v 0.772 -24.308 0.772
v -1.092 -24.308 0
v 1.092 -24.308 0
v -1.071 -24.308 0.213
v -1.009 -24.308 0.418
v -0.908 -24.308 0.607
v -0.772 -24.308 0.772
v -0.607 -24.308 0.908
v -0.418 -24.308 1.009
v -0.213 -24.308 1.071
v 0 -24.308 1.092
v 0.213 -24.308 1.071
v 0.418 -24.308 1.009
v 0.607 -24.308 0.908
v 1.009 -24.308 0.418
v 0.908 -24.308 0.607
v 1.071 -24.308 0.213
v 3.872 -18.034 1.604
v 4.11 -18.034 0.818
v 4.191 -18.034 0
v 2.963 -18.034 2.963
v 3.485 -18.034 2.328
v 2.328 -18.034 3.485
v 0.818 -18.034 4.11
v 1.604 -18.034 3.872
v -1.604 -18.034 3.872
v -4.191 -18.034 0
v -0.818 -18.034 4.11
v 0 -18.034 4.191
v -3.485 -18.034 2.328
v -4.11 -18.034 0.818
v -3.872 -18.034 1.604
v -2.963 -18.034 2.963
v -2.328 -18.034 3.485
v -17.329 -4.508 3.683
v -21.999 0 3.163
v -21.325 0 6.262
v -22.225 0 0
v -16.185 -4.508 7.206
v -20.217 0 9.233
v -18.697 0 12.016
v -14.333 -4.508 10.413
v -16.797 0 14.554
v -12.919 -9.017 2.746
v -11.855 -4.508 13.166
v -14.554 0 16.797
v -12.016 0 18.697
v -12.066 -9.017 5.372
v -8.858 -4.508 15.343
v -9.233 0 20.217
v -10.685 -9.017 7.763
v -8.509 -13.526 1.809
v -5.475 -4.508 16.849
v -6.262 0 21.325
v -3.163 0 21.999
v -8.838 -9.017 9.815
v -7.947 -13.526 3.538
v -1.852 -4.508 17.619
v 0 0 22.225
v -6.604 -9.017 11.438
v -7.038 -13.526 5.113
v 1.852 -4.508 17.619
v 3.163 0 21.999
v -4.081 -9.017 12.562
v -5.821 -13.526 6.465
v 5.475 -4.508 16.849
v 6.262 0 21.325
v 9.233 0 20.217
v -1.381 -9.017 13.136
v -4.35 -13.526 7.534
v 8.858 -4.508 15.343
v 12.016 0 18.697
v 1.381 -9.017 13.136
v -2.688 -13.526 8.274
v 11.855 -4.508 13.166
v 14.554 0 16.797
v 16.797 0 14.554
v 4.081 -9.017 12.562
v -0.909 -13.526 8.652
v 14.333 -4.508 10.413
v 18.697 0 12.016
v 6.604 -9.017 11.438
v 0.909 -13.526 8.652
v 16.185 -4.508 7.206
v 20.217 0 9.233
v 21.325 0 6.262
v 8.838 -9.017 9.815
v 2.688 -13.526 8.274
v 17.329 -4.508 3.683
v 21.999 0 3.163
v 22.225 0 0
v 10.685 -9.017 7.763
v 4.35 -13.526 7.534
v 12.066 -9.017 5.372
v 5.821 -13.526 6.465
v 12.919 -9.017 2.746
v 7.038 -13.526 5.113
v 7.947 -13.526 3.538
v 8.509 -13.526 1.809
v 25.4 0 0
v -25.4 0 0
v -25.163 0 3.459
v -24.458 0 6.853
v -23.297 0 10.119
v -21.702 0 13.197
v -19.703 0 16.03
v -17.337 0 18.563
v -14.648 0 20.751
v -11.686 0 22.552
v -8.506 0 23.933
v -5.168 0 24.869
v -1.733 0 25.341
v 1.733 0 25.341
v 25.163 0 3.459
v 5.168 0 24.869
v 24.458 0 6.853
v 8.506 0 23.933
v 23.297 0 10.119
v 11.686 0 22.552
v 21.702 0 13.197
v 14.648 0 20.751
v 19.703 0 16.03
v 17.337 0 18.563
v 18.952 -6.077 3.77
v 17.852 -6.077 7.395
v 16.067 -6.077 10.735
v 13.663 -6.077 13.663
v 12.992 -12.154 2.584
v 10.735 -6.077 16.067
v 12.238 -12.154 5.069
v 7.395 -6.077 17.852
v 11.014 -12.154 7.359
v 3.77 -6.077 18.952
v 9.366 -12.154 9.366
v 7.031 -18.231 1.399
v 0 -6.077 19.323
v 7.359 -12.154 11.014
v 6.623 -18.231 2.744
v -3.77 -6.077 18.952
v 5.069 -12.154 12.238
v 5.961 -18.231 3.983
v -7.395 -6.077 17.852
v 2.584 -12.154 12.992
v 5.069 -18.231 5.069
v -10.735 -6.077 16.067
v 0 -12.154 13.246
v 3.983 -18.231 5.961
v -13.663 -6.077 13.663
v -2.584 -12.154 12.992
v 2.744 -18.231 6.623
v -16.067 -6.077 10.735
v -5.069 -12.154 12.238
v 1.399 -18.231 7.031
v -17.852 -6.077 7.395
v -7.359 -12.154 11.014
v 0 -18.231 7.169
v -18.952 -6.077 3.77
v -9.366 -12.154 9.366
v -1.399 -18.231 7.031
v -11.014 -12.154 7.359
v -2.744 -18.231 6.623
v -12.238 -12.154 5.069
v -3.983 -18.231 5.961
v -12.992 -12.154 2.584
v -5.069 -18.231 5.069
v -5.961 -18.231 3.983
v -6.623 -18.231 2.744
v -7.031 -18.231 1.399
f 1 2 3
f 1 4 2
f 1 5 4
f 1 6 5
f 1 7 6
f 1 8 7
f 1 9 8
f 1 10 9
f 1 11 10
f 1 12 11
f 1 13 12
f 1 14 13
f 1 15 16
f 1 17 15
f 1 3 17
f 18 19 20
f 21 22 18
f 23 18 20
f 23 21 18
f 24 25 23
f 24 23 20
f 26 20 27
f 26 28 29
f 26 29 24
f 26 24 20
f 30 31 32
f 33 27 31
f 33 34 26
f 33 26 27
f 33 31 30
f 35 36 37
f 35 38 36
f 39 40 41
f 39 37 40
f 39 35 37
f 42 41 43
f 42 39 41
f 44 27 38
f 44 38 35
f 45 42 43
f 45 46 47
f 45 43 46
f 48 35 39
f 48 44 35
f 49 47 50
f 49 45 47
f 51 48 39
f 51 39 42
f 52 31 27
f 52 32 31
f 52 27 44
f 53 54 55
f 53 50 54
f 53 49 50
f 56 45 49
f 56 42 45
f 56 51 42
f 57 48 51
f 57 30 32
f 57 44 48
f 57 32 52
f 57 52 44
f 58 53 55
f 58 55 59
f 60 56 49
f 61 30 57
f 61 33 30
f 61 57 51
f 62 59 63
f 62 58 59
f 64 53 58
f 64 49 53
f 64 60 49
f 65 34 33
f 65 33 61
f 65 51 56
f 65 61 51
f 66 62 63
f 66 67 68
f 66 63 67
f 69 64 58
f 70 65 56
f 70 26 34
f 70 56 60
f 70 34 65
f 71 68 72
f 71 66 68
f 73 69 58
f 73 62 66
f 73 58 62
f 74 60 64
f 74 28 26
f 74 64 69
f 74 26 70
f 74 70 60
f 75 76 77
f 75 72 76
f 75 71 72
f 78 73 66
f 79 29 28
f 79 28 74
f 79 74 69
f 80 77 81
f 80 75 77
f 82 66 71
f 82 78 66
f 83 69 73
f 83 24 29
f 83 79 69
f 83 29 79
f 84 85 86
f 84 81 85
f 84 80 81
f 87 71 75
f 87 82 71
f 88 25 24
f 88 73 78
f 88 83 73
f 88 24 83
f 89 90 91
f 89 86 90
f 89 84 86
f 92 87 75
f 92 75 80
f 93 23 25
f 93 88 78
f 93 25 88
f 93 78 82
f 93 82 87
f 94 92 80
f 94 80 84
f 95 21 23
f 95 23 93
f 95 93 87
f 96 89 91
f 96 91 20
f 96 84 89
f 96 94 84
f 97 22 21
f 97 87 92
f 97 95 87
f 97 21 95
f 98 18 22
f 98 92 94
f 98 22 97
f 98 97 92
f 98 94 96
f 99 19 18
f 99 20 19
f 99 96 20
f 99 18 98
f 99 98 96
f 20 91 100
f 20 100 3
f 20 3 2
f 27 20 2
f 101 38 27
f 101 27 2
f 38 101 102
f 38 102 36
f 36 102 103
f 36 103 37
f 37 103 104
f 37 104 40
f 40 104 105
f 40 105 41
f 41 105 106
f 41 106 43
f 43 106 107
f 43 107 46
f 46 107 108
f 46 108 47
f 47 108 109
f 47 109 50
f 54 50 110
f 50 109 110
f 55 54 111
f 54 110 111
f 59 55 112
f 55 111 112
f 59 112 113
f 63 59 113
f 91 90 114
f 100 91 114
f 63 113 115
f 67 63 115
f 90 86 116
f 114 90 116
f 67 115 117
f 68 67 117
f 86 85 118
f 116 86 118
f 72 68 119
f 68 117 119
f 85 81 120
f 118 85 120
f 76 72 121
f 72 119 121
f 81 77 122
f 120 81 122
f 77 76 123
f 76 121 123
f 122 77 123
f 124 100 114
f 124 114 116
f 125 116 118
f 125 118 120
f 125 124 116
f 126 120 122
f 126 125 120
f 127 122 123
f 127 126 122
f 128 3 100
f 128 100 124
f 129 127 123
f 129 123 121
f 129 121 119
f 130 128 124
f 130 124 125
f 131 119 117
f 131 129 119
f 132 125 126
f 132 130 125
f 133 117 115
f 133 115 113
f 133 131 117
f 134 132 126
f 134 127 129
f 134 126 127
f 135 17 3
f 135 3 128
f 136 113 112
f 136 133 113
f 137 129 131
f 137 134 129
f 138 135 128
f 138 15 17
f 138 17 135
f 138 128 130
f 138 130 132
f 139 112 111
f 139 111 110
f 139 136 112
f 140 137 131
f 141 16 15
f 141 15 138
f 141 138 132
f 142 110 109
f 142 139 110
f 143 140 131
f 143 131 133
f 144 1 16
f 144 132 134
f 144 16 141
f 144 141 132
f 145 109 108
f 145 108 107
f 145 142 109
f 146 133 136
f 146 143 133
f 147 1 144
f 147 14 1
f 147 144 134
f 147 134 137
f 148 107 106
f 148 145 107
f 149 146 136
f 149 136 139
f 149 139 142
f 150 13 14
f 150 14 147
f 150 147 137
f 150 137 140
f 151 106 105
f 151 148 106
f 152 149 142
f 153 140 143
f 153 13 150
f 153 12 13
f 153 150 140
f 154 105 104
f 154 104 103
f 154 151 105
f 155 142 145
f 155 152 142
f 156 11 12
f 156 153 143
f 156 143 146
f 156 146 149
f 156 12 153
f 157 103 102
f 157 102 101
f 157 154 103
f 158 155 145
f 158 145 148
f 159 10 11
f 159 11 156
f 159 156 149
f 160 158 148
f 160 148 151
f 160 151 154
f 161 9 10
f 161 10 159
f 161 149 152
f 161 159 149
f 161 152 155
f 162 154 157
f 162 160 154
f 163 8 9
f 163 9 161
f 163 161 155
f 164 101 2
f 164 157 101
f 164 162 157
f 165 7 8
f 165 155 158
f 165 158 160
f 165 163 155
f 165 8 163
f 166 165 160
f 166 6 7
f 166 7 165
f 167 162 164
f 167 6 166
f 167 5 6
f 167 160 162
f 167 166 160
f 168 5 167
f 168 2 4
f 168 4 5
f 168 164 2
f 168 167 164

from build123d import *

# Parameters (mm, degrees)
F0_R     = 25.4
F1_DEPTH = 24.3078
F1_TAPER = 45
F3_W     = 50.8
F3_H     = 26.1644069105
F4_DEPTH = 28.448
F2_R     = 22.225
F5_DEPTH = 18.034
F5_TAPER = 45


with BuildPart() as f1:
    # F0 (on Front) → F1 (new body)
    with BuildSketch(Plane.XZ):
        Circle(F0_R)
    extrude(amount=F1_DEPTH, taper=F1_TAPER)

    # F3 (on face) → F4 (cut)
    with BuildSketch(Plane(origin=(0, 0, 0), x_dir=(-1, 0, 0), z_dir=(0, 1, 0))):
        with Locations((0, -13.0822034553)):
            Rectangle(F3_W, F3_H)
    extrude(amount=-F4_DEPTH, mode=Mode.SUBTRACT)

    # F2 (on face) → F5 (cut)
    with BuildSketch(Plane(origin=(0, 0, 0), x_dir=(-1, 0, 0), z_dir=(0, 1, 0))):
        Circle(F2_R)
    extrude(amount=-F5_DEPTH, taper=F5_TAPER, mode=Mode.SUBTRACT)


solid = f1.part
